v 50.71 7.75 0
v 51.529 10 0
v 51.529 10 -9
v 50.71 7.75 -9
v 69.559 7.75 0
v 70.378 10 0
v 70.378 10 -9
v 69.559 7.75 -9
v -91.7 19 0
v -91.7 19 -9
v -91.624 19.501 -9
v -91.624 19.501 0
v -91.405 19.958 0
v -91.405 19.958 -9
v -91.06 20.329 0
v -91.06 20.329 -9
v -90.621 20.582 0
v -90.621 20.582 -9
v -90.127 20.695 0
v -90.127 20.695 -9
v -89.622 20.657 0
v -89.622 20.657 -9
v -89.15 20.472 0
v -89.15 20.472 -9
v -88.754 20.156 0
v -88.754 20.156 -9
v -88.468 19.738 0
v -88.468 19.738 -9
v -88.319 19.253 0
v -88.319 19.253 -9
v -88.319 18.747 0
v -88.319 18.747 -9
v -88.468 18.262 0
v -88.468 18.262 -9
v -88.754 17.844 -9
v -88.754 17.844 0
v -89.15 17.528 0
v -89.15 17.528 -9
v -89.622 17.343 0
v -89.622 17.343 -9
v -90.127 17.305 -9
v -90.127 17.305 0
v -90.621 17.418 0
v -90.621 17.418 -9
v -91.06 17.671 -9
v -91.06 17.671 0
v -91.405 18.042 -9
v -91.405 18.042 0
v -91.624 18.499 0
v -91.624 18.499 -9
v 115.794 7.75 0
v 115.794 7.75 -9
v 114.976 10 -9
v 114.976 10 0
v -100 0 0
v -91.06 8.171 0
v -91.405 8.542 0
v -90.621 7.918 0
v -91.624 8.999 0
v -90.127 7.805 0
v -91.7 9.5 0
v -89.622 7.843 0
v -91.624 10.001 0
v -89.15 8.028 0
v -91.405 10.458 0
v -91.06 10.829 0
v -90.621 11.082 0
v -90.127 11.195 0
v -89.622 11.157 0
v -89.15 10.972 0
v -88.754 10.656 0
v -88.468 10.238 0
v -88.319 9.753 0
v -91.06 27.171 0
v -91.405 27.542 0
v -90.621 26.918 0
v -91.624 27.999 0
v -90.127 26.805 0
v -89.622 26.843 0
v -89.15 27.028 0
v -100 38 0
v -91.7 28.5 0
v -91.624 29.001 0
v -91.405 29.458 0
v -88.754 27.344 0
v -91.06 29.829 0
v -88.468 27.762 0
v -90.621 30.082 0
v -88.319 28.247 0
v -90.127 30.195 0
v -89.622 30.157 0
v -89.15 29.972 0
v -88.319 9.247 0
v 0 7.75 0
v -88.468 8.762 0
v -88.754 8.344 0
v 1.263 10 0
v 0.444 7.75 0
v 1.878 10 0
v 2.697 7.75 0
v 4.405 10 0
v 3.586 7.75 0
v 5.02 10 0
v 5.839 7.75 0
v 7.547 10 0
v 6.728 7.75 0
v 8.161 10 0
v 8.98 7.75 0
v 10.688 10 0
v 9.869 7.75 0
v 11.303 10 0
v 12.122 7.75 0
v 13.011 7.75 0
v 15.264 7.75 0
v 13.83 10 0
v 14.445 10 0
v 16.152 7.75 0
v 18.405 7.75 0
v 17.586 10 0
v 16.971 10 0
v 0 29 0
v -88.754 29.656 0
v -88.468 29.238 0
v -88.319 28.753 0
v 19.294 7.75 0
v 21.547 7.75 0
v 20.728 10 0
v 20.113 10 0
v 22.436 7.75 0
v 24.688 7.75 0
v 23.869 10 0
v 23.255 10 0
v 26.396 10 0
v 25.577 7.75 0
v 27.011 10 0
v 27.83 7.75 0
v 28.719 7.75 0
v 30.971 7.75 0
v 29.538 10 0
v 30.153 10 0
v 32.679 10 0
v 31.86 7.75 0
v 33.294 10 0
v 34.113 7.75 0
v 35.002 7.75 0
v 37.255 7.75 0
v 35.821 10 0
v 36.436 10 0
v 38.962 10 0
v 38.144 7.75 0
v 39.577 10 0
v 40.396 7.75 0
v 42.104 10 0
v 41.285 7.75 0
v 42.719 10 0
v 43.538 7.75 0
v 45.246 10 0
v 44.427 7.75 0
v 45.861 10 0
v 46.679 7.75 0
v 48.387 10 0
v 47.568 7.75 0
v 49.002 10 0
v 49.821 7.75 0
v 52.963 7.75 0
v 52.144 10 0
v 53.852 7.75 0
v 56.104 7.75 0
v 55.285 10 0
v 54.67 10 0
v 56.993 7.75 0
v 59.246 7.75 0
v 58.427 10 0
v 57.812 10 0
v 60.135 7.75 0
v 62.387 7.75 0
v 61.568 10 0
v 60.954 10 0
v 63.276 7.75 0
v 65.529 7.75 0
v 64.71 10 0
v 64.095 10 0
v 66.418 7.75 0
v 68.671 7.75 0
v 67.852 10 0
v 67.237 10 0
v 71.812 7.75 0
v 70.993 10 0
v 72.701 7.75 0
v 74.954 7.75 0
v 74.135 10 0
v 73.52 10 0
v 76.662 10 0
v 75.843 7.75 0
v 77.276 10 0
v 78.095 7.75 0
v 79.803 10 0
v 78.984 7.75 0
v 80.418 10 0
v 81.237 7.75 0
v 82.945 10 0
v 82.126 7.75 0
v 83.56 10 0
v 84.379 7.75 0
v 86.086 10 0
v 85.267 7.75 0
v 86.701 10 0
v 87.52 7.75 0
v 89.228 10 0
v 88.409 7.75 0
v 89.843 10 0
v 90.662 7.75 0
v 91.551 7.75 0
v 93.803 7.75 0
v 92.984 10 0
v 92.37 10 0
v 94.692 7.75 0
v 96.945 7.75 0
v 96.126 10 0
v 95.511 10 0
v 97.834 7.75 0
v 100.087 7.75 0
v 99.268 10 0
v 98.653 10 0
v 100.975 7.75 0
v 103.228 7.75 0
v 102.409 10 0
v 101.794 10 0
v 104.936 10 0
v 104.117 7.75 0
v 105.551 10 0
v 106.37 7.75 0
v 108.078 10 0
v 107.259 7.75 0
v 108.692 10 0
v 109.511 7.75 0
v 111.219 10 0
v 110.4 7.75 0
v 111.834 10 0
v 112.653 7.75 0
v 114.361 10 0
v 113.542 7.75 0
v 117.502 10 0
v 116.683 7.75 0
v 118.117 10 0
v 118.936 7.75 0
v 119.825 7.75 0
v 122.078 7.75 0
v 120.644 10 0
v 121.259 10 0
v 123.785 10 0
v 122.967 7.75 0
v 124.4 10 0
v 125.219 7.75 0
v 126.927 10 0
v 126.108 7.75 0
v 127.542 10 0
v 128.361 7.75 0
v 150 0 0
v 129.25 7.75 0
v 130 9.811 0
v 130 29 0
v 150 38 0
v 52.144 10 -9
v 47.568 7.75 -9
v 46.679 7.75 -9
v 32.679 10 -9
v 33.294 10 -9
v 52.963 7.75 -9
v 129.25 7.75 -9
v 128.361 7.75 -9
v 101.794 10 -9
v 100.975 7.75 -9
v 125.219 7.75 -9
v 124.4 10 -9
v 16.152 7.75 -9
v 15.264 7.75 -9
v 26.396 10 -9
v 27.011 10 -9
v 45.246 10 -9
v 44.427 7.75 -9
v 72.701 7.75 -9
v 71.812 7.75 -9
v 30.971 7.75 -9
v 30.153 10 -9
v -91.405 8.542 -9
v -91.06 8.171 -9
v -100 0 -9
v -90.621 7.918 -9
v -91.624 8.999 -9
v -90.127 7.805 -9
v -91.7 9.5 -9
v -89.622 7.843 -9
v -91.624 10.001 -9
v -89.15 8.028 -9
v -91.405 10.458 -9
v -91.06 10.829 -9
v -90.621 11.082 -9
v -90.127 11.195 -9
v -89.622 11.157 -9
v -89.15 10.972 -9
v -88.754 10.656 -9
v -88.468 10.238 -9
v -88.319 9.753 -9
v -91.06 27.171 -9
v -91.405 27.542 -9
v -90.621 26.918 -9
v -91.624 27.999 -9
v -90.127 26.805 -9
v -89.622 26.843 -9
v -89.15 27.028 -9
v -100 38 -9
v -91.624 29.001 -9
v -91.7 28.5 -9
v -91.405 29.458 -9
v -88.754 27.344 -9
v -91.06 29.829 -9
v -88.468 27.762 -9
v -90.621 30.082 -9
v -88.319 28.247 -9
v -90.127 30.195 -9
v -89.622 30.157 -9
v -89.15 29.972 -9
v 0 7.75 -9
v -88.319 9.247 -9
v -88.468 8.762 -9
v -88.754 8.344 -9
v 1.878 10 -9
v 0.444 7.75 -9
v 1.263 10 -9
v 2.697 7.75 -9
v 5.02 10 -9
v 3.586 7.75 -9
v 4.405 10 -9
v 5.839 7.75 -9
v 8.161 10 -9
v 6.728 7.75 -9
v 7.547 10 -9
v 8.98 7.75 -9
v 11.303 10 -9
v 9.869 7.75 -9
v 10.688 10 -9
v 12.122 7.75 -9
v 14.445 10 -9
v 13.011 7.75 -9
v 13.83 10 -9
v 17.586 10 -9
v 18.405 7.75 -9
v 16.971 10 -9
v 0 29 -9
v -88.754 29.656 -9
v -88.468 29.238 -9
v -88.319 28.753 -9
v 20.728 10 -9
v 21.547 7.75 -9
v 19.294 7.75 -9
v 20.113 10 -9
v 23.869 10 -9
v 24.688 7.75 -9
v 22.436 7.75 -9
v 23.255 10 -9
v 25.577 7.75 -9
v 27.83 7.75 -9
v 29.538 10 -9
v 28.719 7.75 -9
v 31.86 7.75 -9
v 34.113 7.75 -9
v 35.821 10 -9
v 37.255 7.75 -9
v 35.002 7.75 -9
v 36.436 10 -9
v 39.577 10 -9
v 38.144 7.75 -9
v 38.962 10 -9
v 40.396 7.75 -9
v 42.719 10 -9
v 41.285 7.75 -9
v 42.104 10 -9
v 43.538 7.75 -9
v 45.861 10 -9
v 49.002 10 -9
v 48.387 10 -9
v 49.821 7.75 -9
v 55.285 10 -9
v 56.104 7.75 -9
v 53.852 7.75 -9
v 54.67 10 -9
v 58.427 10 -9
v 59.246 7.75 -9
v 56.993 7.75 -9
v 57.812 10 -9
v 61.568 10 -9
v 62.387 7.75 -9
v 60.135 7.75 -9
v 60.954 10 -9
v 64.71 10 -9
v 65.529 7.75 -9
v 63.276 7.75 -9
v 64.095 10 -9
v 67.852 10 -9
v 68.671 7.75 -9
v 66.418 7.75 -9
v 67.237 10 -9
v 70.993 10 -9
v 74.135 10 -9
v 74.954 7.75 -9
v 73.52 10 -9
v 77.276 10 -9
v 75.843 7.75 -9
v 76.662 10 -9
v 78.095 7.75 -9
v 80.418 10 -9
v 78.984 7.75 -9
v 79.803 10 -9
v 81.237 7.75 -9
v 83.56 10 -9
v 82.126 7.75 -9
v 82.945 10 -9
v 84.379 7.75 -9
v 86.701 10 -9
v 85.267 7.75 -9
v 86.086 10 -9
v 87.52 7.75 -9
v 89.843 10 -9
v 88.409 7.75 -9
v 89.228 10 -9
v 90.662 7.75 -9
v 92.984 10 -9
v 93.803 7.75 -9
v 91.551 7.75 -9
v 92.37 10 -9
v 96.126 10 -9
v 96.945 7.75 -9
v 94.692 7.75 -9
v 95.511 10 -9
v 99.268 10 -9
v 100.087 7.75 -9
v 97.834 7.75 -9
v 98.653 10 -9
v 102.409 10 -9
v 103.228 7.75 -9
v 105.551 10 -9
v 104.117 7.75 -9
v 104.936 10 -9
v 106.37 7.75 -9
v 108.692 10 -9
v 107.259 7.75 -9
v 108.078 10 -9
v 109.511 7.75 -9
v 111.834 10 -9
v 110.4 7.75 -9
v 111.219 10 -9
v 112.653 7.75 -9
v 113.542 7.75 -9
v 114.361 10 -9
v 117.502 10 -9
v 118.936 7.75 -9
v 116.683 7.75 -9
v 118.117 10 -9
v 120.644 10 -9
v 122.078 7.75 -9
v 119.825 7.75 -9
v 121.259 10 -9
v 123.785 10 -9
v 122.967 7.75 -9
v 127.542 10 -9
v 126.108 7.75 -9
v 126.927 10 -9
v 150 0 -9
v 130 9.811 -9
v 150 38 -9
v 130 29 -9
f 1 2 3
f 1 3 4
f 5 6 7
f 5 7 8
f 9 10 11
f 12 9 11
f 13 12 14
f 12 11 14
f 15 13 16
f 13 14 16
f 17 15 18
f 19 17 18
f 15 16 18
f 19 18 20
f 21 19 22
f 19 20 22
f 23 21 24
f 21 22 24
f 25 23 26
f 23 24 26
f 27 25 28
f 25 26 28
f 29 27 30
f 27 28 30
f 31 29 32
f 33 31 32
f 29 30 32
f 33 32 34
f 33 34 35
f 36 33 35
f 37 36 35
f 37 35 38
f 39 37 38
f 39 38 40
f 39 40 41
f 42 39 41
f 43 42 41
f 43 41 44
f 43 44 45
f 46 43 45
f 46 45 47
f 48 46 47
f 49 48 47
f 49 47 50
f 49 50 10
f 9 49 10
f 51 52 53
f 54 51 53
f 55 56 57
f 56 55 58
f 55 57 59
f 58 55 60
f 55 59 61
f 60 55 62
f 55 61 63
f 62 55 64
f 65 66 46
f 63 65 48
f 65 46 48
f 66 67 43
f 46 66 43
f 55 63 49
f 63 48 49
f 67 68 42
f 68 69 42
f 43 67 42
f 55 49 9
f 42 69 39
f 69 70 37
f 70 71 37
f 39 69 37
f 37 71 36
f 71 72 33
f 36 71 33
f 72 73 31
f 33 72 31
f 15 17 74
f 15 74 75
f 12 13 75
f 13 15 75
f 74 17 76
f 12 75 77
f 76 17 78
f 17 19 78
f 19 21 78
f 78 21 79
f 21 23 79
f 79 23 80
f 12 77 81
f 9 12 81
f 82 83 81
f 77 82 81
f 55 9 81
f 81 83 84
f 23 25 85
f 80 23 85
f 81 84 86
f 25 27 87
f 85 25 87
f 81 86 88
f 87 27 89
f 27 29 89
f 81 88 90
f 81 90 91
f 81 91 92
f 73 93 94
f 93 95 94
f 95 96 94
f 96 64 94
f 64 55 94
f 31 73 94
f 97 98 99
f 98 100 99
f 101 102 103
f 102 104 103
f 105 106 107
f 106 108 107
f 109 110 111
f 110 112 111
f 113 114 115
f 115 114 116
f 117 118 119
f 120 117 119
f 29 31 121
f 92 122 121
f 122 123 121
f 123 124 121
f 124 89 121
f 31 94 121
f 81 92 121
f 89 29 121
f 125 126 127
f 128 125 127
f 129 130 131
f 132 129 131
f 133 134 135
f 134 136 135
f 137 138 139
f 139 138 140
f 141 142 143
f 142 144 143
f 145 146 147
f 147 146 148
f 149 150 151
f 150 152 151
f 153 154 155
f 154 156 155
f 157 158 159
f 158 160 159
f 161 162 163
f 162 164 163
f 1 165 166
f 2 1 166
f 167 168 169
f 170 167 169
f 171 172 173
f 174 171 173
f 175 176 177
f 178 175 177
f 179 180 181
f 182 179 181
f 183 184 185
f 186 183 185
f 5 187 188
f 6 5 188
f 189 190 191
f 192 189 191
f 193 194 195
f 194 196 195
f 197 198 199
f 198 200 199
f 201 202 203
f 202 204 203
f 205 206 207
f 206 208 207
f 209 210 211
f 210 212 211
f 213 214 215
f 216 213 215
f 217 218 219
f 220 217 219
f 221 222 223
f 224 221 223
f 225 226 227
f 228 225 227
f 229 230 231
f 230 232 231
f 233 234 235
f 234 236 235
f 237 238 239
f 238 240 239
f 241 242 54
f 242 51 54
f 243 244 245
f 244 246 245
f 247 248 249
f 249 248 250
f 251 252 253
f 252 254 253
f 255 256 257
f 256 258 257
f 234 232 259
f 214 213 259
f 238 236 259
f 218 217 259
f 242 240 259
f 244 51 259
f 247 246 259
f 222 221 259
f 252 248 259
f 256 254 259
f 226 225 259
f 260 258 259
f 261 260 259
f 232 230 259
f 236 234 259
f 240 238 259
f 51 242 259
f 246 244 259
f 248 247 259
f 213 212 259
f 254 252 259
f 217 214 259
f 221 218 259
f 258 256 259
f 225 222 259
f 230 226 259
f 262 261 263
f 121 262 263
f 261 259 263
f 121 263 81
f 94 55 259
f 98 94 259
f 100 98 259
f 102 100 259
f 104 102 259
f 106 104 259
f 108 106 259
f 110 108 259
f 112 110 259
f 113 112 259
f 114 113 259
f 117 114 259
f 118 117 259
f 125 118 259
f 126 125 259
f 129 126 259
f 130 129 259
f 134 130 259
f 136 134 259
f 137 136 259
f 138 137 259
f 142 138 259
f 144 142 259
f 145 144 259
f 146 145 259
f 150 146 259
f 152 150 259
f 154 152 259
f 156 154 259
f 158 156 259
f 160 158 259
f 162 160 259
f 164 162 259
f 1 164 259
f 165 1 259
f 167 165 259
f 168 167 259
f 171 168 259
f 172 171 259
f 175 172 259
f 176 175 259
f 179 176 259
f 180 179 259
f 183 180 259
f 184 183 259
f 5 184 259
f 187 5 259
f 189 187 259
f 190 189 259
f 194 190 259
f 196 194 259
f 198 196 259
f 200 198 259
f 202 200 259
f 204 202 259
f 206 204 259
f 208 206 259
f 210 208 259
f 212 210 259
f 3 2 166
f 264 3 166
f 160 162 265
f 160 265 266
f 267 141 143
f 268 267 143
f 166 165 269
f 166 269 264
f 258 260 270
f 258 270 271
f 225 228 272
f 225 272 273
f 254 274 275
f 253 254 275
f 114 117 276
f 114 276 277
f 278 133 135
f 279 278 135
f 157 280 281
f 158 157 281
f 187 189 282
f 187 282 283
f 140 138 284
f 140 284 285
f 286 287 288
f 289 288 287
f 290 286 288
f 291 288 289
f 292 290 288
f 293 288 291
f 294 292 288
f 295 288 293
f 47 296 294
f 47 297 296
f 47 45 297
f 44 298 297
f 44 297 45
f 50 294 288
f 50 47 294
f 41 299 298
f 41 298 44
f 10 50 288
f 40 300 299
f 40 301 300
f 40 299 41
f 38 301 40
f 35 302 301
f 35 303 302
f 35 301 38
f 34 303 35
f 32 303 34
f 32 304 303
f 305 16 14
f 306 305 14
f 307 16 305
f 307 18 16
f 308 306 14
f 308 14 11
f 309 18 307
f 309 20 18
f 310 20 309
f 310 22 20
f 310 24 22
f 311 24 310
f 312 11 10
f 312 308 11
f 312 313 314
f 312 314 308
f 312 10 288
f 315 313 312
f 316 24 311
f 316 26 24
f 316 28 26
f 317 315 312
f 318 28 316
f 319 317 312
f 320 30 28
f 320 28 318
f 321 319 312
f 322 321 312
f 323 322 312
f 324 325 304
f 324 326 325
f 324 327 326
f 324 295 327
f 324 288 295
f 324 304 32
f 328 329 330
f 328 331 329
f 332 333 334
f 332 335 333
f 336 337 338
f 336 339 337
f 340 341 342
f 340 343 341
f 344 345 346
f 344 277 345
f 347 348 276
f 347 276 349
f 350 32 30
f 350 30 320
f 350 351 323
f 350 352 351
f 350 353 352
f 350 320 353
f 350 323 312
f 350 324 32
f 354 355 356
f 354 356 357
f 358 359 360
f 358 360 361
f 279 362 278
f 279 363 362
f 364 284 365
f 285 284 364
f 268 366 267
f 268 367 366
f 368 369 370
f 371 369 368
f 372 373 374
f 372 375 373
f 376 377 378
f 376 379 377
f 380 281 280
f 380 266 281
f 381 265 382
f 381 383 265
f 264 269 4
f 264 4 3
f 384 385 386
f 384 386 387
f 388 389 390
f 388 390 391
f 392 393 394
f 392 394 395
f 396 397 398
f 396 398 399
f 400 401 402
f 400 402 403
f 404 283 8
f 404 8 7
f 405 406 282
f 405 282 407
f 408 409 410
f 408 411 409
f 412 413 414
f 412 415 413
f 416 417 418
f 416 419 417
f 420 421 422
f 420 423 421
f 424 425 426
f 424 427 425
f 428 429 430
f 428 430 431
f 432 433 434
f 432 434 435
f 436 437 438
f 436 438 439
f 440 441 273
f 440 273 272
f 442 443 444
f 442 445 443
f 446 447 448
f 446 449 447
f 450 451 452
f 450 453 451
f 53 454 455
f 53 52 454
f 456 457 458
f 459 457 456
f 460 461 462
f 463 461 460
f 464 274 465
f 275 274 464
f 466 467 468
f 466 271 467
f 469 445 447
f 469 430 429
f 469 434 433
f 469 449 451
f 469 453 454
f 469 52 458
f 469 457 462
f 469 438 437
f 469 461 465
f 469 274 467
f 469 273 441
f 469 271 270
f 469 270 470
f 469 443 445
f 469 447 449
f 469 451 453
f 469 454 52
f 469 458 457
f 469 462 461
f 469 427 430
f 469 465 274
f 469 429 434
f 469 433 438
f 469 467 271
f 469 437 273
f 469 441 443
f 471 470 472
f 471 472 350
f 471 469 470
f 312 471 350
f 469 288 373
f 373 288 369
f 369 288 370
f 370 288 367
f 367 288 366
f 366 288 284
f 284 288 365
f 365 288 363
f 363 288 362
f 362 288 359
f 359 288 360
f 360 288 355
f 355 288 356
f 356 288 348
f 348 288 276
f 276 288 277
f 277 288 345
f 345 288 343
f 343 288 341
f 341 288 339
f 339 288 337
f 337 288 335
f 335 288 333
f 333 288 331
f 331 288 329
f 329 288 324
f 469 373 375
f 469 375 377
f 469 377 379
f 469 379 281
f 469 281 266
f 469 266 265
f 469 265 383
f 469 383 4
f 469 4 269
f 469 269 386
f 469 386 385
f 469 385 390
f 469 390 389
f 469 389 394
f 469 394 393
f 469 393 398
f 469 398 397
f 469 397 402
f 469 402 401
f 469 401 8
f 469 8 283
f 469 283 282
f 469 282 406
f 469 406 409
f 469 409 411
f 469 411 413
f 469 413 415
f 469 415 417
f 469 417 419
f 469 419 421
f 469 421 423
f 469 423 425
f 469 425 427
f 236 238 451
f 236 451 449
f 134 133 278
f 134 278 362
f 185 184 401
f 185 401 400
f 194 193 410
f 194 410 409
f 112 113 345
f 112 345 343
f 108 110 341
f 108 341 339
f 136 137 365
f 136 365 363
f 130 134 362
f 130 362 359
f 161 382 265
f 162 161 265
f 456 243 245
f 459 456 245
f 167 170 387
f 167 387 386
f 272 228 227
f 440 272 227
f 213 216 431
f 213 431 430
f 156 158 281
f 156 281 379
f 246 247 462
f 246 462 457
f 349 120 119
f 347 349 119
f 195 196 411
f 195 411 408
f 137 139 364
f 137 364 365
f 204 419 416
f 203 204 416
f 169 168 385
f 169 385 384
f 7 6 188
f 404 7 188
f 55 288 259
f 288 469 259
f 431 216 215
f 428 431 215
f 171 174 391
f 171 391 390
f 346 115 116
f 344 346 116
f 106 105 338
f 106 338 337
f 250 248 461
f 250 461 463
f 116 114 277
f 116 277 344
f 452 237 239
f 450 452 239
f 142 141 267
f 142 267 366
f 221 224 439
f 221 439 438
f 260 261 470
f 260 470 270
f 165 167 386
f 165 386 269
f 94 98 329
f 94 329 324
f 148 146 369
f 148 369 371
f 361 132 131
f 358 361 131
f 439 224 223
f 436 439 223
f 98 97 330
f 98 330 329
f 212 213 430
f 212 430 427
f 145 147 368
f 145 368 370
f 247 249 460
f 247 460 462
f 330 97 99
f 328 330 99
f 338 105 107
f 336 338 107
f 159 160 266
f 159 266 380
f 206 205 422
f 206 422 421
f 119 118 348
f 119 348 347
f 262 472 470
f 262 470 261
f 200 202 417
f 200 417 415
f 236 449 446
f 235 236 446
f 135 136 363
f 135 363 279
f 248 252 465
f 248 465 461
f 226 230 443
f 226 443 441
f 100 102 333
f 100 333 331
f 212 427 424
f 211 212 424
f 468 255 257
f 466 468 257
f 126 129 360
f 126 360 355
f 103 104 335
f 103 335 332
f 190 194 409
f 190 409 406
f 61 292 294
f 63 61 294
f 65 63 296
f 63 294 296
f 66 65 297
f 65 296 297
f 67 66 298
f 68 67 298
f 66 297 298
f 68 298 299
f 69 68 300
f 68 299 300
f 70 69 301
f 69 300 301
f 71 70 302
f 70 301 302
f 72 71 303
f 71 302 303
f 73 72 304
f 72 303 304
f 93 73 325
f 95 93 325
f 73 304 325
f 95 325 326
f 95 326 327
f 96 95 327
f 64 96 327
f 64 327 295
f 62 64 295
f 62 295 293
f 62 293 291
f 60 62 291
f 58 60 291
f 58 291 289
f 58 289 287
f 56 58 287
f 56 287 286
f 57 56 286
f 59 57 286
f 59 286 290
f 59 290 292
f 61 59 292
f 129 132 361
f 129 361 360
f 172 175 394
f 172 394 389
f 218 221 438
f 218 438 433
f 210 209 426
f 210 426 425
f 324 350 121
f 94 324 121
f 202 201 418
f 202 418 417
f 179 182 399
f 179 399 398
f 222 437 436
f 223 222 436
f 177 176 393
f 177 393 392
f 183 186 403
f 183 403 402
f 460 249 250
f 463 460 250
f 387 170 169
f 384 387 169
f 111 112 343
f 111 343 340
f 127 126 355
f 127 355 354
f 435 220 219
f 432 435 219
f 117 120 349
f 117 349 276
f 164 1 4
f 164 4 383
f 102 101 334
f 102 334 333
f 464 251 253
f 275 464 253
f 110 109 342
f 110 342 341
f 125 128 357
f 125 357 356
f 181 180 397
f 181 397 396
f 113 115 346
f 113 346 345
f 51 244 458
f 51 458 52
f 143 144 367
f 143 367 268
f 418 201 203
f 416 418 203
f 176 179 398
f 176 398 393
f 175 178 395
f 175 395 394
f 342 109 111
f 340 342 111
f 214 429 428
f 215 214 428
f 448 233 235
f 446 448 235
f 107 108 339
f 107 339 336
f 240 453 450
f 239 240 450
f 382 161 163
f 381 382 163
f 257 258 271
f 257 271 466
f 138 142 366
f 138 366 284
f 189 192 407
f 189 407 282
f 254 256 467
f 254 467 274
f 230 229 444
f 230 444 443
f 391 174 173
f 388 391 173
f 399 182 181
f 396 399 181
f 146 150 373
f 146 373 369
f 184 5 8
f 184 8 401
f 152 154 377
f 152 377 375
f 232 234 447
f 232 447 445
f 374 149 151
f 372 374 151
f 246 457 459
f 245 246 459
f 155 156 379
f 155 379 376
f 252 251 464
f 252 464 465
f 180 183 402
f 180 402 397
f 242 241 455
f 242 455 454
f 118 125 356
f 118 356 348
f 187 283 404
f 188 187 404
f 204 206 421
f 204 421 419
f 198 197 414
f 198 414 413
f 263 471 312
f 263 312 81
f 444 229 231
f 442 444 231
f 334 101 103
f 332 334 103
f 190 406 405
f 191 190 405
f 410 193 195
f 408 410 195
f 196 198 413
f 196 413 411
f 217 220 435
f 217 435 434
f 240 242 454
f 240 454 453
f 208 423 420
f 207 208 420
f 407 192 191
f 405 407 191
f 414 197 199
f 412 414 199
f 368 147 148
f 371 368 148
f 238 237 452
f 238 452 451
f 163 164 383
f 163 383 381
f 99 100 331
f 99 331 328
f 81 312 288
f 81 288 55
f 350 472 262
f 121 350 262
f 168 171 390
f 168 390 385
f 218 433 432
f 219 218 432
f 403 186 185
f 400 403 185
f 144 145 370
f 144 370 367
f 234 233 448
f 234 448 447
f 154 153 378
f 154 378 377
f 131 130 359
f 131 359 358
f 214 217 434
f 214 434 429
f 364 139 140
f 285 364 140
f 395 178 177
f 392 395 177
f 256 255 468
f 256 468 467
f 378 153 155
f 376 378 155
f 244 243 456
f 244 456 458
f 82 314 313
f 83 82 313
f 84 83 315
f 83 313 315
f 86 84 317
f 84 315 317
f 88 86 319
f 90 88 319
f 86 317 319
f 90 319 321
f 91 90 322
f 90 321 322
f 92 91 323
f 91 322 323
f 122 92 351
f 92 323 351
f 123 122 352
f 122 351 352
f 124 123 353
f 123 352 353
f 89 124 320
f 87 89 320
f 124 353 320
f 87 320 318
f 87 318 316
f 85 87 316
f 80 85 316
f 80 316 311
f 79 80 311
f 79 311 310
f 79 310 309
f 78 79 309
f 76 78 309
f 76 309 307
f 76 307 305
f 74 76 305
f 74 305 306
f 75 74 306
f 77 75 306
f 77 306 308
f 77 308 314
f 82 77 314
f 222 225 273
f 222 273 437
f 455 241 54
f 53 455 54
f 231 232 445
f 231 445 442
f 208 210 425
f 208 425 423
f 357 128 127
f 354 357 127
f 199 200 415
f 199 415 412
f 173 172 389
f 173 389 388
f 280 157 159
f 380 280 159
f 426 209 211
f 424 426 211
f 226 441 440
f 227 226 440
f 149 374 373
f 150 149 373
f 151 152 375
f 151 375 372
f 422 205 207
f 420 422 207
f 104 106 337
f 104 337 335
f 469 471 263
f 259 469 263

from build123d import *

# Parameters (mm, degrees)
BLANKSKE_W          = 130
BLANKSKE_H          = 10
BLANK_DEPTH         = 9
TOOTHCUTSIM_DEPTH   = 131.694299799
TEETHCUTS_COUNT     = 91
TEETHCUTS_PITCH     = 3.14159265
SKETCH2_W           = 20
SKETCH2_H           = 9
BOSS_EXTRUDE1_DEPTH = 29
SKETCH3_W           = 9
SKETCH3_H           = 9
BOSS_EXTRUDE2_DEPTH = 20
SKETCH3_2_W         = 9
SKETCH3_2_H         = 9
BOSS_EXTRUDE3_DEPTH = 130
SKETCH4_W           = 9
SKETCH4_H           = 38
BOSS_EXTRUDE4_DEPTH = 100
SKETCH5_R           = 1.7
CUT_EXTRUDE1_DEPTH  = 10


with BuildPart() as part:
    # BlankSke → Blank (new body)
    with BuildSketch(Plane.XY):
        with Locations((65, 5)):
            Rectangle(BLANKSKE_W, BLANKSKE_H)
    extrude(amount=-BLANK_DEPTH)

    # TooCutSkeSim → ToothCutSim (cut, through all)
    with BuildSketch(Plane.XY):
        Polygon((0.44443537, 7.75), (-0.44443537, 7.75), (-1.272613241, 10.0254), (1.272613241, 10.0254), align=None)
    toothcutsim = extrude(amount=-TOOTHCUTSIM_DEPTH, mode=Mode.SUBTRACT)

    # TeethCuts: ToothCutSim ×91
    with Locations(*[(i * TEETHCUTS_PITCH, 0, 0) for i in range(1, TEETHCUTS_COUNT)]):
        add(toothcutsim, mode=Mode.SUBTRACT)

    # Sketch2 → Boss-Extrude1 (add)
    with BuildSketch(Plane.XZ):
        with Locations((140, -4.5)):
            Rectangle(SKETCH2_W, SKETCH2_H)
    extrude(amount=-BOSS_EXTRUDE1_DEPTH)

    # Sketch3 → Boss-Extrude2 (add)
    with BuildSketch(Plane.ZY.offset(-130)):
        with Locations((-4.5, 33.5)):
            Rectangle(SKETCH3_W, SKETCH3_H)
    extrude(amount=-BOSS_EXTRUDE2_DEPTH)

    # Sketch3<2> → Boss-Extrude3 (add)
    with BuildSketch(Plane.ZY.offset(-130)):
        with Locations((-4.5, 33.5)):
            Rectangle(SKETCH3_2_W, SKETCH3_2_H)
    extrude(amount=BOSS_EXTRUDE3_DEPTH)

    # Sketch4 → Boss-Extrude4 (add)
    with BuildSketch(Plane.ZY):
        with Locations((-4.5, 19)):
            Rectangle(SKETCH4_W, SKETCH4_H)
    extrude(amount=BOSS_EXTRUDE4_DEPTH)

    # Sketch5 → Cut-Extrude1 (cut)
    with BuildSketch(Plane(origin=(0, 0, -9), x_dir=(-1, 0, 0), z_dir=(0, 0, -1))):
        with Locations((90, 19)):
            Circle(SKETCH5_R)
        with Locations((90, 9.5)):
            Circle(SKETCH5_R)
        with Locations((90, 28.5)):
            Circle(SKETCH5_R)
    extrude(amount=-CUT_EXTRUDE1_DEPTH, mode=Mode.SUBTRACT)


solid = part.part
